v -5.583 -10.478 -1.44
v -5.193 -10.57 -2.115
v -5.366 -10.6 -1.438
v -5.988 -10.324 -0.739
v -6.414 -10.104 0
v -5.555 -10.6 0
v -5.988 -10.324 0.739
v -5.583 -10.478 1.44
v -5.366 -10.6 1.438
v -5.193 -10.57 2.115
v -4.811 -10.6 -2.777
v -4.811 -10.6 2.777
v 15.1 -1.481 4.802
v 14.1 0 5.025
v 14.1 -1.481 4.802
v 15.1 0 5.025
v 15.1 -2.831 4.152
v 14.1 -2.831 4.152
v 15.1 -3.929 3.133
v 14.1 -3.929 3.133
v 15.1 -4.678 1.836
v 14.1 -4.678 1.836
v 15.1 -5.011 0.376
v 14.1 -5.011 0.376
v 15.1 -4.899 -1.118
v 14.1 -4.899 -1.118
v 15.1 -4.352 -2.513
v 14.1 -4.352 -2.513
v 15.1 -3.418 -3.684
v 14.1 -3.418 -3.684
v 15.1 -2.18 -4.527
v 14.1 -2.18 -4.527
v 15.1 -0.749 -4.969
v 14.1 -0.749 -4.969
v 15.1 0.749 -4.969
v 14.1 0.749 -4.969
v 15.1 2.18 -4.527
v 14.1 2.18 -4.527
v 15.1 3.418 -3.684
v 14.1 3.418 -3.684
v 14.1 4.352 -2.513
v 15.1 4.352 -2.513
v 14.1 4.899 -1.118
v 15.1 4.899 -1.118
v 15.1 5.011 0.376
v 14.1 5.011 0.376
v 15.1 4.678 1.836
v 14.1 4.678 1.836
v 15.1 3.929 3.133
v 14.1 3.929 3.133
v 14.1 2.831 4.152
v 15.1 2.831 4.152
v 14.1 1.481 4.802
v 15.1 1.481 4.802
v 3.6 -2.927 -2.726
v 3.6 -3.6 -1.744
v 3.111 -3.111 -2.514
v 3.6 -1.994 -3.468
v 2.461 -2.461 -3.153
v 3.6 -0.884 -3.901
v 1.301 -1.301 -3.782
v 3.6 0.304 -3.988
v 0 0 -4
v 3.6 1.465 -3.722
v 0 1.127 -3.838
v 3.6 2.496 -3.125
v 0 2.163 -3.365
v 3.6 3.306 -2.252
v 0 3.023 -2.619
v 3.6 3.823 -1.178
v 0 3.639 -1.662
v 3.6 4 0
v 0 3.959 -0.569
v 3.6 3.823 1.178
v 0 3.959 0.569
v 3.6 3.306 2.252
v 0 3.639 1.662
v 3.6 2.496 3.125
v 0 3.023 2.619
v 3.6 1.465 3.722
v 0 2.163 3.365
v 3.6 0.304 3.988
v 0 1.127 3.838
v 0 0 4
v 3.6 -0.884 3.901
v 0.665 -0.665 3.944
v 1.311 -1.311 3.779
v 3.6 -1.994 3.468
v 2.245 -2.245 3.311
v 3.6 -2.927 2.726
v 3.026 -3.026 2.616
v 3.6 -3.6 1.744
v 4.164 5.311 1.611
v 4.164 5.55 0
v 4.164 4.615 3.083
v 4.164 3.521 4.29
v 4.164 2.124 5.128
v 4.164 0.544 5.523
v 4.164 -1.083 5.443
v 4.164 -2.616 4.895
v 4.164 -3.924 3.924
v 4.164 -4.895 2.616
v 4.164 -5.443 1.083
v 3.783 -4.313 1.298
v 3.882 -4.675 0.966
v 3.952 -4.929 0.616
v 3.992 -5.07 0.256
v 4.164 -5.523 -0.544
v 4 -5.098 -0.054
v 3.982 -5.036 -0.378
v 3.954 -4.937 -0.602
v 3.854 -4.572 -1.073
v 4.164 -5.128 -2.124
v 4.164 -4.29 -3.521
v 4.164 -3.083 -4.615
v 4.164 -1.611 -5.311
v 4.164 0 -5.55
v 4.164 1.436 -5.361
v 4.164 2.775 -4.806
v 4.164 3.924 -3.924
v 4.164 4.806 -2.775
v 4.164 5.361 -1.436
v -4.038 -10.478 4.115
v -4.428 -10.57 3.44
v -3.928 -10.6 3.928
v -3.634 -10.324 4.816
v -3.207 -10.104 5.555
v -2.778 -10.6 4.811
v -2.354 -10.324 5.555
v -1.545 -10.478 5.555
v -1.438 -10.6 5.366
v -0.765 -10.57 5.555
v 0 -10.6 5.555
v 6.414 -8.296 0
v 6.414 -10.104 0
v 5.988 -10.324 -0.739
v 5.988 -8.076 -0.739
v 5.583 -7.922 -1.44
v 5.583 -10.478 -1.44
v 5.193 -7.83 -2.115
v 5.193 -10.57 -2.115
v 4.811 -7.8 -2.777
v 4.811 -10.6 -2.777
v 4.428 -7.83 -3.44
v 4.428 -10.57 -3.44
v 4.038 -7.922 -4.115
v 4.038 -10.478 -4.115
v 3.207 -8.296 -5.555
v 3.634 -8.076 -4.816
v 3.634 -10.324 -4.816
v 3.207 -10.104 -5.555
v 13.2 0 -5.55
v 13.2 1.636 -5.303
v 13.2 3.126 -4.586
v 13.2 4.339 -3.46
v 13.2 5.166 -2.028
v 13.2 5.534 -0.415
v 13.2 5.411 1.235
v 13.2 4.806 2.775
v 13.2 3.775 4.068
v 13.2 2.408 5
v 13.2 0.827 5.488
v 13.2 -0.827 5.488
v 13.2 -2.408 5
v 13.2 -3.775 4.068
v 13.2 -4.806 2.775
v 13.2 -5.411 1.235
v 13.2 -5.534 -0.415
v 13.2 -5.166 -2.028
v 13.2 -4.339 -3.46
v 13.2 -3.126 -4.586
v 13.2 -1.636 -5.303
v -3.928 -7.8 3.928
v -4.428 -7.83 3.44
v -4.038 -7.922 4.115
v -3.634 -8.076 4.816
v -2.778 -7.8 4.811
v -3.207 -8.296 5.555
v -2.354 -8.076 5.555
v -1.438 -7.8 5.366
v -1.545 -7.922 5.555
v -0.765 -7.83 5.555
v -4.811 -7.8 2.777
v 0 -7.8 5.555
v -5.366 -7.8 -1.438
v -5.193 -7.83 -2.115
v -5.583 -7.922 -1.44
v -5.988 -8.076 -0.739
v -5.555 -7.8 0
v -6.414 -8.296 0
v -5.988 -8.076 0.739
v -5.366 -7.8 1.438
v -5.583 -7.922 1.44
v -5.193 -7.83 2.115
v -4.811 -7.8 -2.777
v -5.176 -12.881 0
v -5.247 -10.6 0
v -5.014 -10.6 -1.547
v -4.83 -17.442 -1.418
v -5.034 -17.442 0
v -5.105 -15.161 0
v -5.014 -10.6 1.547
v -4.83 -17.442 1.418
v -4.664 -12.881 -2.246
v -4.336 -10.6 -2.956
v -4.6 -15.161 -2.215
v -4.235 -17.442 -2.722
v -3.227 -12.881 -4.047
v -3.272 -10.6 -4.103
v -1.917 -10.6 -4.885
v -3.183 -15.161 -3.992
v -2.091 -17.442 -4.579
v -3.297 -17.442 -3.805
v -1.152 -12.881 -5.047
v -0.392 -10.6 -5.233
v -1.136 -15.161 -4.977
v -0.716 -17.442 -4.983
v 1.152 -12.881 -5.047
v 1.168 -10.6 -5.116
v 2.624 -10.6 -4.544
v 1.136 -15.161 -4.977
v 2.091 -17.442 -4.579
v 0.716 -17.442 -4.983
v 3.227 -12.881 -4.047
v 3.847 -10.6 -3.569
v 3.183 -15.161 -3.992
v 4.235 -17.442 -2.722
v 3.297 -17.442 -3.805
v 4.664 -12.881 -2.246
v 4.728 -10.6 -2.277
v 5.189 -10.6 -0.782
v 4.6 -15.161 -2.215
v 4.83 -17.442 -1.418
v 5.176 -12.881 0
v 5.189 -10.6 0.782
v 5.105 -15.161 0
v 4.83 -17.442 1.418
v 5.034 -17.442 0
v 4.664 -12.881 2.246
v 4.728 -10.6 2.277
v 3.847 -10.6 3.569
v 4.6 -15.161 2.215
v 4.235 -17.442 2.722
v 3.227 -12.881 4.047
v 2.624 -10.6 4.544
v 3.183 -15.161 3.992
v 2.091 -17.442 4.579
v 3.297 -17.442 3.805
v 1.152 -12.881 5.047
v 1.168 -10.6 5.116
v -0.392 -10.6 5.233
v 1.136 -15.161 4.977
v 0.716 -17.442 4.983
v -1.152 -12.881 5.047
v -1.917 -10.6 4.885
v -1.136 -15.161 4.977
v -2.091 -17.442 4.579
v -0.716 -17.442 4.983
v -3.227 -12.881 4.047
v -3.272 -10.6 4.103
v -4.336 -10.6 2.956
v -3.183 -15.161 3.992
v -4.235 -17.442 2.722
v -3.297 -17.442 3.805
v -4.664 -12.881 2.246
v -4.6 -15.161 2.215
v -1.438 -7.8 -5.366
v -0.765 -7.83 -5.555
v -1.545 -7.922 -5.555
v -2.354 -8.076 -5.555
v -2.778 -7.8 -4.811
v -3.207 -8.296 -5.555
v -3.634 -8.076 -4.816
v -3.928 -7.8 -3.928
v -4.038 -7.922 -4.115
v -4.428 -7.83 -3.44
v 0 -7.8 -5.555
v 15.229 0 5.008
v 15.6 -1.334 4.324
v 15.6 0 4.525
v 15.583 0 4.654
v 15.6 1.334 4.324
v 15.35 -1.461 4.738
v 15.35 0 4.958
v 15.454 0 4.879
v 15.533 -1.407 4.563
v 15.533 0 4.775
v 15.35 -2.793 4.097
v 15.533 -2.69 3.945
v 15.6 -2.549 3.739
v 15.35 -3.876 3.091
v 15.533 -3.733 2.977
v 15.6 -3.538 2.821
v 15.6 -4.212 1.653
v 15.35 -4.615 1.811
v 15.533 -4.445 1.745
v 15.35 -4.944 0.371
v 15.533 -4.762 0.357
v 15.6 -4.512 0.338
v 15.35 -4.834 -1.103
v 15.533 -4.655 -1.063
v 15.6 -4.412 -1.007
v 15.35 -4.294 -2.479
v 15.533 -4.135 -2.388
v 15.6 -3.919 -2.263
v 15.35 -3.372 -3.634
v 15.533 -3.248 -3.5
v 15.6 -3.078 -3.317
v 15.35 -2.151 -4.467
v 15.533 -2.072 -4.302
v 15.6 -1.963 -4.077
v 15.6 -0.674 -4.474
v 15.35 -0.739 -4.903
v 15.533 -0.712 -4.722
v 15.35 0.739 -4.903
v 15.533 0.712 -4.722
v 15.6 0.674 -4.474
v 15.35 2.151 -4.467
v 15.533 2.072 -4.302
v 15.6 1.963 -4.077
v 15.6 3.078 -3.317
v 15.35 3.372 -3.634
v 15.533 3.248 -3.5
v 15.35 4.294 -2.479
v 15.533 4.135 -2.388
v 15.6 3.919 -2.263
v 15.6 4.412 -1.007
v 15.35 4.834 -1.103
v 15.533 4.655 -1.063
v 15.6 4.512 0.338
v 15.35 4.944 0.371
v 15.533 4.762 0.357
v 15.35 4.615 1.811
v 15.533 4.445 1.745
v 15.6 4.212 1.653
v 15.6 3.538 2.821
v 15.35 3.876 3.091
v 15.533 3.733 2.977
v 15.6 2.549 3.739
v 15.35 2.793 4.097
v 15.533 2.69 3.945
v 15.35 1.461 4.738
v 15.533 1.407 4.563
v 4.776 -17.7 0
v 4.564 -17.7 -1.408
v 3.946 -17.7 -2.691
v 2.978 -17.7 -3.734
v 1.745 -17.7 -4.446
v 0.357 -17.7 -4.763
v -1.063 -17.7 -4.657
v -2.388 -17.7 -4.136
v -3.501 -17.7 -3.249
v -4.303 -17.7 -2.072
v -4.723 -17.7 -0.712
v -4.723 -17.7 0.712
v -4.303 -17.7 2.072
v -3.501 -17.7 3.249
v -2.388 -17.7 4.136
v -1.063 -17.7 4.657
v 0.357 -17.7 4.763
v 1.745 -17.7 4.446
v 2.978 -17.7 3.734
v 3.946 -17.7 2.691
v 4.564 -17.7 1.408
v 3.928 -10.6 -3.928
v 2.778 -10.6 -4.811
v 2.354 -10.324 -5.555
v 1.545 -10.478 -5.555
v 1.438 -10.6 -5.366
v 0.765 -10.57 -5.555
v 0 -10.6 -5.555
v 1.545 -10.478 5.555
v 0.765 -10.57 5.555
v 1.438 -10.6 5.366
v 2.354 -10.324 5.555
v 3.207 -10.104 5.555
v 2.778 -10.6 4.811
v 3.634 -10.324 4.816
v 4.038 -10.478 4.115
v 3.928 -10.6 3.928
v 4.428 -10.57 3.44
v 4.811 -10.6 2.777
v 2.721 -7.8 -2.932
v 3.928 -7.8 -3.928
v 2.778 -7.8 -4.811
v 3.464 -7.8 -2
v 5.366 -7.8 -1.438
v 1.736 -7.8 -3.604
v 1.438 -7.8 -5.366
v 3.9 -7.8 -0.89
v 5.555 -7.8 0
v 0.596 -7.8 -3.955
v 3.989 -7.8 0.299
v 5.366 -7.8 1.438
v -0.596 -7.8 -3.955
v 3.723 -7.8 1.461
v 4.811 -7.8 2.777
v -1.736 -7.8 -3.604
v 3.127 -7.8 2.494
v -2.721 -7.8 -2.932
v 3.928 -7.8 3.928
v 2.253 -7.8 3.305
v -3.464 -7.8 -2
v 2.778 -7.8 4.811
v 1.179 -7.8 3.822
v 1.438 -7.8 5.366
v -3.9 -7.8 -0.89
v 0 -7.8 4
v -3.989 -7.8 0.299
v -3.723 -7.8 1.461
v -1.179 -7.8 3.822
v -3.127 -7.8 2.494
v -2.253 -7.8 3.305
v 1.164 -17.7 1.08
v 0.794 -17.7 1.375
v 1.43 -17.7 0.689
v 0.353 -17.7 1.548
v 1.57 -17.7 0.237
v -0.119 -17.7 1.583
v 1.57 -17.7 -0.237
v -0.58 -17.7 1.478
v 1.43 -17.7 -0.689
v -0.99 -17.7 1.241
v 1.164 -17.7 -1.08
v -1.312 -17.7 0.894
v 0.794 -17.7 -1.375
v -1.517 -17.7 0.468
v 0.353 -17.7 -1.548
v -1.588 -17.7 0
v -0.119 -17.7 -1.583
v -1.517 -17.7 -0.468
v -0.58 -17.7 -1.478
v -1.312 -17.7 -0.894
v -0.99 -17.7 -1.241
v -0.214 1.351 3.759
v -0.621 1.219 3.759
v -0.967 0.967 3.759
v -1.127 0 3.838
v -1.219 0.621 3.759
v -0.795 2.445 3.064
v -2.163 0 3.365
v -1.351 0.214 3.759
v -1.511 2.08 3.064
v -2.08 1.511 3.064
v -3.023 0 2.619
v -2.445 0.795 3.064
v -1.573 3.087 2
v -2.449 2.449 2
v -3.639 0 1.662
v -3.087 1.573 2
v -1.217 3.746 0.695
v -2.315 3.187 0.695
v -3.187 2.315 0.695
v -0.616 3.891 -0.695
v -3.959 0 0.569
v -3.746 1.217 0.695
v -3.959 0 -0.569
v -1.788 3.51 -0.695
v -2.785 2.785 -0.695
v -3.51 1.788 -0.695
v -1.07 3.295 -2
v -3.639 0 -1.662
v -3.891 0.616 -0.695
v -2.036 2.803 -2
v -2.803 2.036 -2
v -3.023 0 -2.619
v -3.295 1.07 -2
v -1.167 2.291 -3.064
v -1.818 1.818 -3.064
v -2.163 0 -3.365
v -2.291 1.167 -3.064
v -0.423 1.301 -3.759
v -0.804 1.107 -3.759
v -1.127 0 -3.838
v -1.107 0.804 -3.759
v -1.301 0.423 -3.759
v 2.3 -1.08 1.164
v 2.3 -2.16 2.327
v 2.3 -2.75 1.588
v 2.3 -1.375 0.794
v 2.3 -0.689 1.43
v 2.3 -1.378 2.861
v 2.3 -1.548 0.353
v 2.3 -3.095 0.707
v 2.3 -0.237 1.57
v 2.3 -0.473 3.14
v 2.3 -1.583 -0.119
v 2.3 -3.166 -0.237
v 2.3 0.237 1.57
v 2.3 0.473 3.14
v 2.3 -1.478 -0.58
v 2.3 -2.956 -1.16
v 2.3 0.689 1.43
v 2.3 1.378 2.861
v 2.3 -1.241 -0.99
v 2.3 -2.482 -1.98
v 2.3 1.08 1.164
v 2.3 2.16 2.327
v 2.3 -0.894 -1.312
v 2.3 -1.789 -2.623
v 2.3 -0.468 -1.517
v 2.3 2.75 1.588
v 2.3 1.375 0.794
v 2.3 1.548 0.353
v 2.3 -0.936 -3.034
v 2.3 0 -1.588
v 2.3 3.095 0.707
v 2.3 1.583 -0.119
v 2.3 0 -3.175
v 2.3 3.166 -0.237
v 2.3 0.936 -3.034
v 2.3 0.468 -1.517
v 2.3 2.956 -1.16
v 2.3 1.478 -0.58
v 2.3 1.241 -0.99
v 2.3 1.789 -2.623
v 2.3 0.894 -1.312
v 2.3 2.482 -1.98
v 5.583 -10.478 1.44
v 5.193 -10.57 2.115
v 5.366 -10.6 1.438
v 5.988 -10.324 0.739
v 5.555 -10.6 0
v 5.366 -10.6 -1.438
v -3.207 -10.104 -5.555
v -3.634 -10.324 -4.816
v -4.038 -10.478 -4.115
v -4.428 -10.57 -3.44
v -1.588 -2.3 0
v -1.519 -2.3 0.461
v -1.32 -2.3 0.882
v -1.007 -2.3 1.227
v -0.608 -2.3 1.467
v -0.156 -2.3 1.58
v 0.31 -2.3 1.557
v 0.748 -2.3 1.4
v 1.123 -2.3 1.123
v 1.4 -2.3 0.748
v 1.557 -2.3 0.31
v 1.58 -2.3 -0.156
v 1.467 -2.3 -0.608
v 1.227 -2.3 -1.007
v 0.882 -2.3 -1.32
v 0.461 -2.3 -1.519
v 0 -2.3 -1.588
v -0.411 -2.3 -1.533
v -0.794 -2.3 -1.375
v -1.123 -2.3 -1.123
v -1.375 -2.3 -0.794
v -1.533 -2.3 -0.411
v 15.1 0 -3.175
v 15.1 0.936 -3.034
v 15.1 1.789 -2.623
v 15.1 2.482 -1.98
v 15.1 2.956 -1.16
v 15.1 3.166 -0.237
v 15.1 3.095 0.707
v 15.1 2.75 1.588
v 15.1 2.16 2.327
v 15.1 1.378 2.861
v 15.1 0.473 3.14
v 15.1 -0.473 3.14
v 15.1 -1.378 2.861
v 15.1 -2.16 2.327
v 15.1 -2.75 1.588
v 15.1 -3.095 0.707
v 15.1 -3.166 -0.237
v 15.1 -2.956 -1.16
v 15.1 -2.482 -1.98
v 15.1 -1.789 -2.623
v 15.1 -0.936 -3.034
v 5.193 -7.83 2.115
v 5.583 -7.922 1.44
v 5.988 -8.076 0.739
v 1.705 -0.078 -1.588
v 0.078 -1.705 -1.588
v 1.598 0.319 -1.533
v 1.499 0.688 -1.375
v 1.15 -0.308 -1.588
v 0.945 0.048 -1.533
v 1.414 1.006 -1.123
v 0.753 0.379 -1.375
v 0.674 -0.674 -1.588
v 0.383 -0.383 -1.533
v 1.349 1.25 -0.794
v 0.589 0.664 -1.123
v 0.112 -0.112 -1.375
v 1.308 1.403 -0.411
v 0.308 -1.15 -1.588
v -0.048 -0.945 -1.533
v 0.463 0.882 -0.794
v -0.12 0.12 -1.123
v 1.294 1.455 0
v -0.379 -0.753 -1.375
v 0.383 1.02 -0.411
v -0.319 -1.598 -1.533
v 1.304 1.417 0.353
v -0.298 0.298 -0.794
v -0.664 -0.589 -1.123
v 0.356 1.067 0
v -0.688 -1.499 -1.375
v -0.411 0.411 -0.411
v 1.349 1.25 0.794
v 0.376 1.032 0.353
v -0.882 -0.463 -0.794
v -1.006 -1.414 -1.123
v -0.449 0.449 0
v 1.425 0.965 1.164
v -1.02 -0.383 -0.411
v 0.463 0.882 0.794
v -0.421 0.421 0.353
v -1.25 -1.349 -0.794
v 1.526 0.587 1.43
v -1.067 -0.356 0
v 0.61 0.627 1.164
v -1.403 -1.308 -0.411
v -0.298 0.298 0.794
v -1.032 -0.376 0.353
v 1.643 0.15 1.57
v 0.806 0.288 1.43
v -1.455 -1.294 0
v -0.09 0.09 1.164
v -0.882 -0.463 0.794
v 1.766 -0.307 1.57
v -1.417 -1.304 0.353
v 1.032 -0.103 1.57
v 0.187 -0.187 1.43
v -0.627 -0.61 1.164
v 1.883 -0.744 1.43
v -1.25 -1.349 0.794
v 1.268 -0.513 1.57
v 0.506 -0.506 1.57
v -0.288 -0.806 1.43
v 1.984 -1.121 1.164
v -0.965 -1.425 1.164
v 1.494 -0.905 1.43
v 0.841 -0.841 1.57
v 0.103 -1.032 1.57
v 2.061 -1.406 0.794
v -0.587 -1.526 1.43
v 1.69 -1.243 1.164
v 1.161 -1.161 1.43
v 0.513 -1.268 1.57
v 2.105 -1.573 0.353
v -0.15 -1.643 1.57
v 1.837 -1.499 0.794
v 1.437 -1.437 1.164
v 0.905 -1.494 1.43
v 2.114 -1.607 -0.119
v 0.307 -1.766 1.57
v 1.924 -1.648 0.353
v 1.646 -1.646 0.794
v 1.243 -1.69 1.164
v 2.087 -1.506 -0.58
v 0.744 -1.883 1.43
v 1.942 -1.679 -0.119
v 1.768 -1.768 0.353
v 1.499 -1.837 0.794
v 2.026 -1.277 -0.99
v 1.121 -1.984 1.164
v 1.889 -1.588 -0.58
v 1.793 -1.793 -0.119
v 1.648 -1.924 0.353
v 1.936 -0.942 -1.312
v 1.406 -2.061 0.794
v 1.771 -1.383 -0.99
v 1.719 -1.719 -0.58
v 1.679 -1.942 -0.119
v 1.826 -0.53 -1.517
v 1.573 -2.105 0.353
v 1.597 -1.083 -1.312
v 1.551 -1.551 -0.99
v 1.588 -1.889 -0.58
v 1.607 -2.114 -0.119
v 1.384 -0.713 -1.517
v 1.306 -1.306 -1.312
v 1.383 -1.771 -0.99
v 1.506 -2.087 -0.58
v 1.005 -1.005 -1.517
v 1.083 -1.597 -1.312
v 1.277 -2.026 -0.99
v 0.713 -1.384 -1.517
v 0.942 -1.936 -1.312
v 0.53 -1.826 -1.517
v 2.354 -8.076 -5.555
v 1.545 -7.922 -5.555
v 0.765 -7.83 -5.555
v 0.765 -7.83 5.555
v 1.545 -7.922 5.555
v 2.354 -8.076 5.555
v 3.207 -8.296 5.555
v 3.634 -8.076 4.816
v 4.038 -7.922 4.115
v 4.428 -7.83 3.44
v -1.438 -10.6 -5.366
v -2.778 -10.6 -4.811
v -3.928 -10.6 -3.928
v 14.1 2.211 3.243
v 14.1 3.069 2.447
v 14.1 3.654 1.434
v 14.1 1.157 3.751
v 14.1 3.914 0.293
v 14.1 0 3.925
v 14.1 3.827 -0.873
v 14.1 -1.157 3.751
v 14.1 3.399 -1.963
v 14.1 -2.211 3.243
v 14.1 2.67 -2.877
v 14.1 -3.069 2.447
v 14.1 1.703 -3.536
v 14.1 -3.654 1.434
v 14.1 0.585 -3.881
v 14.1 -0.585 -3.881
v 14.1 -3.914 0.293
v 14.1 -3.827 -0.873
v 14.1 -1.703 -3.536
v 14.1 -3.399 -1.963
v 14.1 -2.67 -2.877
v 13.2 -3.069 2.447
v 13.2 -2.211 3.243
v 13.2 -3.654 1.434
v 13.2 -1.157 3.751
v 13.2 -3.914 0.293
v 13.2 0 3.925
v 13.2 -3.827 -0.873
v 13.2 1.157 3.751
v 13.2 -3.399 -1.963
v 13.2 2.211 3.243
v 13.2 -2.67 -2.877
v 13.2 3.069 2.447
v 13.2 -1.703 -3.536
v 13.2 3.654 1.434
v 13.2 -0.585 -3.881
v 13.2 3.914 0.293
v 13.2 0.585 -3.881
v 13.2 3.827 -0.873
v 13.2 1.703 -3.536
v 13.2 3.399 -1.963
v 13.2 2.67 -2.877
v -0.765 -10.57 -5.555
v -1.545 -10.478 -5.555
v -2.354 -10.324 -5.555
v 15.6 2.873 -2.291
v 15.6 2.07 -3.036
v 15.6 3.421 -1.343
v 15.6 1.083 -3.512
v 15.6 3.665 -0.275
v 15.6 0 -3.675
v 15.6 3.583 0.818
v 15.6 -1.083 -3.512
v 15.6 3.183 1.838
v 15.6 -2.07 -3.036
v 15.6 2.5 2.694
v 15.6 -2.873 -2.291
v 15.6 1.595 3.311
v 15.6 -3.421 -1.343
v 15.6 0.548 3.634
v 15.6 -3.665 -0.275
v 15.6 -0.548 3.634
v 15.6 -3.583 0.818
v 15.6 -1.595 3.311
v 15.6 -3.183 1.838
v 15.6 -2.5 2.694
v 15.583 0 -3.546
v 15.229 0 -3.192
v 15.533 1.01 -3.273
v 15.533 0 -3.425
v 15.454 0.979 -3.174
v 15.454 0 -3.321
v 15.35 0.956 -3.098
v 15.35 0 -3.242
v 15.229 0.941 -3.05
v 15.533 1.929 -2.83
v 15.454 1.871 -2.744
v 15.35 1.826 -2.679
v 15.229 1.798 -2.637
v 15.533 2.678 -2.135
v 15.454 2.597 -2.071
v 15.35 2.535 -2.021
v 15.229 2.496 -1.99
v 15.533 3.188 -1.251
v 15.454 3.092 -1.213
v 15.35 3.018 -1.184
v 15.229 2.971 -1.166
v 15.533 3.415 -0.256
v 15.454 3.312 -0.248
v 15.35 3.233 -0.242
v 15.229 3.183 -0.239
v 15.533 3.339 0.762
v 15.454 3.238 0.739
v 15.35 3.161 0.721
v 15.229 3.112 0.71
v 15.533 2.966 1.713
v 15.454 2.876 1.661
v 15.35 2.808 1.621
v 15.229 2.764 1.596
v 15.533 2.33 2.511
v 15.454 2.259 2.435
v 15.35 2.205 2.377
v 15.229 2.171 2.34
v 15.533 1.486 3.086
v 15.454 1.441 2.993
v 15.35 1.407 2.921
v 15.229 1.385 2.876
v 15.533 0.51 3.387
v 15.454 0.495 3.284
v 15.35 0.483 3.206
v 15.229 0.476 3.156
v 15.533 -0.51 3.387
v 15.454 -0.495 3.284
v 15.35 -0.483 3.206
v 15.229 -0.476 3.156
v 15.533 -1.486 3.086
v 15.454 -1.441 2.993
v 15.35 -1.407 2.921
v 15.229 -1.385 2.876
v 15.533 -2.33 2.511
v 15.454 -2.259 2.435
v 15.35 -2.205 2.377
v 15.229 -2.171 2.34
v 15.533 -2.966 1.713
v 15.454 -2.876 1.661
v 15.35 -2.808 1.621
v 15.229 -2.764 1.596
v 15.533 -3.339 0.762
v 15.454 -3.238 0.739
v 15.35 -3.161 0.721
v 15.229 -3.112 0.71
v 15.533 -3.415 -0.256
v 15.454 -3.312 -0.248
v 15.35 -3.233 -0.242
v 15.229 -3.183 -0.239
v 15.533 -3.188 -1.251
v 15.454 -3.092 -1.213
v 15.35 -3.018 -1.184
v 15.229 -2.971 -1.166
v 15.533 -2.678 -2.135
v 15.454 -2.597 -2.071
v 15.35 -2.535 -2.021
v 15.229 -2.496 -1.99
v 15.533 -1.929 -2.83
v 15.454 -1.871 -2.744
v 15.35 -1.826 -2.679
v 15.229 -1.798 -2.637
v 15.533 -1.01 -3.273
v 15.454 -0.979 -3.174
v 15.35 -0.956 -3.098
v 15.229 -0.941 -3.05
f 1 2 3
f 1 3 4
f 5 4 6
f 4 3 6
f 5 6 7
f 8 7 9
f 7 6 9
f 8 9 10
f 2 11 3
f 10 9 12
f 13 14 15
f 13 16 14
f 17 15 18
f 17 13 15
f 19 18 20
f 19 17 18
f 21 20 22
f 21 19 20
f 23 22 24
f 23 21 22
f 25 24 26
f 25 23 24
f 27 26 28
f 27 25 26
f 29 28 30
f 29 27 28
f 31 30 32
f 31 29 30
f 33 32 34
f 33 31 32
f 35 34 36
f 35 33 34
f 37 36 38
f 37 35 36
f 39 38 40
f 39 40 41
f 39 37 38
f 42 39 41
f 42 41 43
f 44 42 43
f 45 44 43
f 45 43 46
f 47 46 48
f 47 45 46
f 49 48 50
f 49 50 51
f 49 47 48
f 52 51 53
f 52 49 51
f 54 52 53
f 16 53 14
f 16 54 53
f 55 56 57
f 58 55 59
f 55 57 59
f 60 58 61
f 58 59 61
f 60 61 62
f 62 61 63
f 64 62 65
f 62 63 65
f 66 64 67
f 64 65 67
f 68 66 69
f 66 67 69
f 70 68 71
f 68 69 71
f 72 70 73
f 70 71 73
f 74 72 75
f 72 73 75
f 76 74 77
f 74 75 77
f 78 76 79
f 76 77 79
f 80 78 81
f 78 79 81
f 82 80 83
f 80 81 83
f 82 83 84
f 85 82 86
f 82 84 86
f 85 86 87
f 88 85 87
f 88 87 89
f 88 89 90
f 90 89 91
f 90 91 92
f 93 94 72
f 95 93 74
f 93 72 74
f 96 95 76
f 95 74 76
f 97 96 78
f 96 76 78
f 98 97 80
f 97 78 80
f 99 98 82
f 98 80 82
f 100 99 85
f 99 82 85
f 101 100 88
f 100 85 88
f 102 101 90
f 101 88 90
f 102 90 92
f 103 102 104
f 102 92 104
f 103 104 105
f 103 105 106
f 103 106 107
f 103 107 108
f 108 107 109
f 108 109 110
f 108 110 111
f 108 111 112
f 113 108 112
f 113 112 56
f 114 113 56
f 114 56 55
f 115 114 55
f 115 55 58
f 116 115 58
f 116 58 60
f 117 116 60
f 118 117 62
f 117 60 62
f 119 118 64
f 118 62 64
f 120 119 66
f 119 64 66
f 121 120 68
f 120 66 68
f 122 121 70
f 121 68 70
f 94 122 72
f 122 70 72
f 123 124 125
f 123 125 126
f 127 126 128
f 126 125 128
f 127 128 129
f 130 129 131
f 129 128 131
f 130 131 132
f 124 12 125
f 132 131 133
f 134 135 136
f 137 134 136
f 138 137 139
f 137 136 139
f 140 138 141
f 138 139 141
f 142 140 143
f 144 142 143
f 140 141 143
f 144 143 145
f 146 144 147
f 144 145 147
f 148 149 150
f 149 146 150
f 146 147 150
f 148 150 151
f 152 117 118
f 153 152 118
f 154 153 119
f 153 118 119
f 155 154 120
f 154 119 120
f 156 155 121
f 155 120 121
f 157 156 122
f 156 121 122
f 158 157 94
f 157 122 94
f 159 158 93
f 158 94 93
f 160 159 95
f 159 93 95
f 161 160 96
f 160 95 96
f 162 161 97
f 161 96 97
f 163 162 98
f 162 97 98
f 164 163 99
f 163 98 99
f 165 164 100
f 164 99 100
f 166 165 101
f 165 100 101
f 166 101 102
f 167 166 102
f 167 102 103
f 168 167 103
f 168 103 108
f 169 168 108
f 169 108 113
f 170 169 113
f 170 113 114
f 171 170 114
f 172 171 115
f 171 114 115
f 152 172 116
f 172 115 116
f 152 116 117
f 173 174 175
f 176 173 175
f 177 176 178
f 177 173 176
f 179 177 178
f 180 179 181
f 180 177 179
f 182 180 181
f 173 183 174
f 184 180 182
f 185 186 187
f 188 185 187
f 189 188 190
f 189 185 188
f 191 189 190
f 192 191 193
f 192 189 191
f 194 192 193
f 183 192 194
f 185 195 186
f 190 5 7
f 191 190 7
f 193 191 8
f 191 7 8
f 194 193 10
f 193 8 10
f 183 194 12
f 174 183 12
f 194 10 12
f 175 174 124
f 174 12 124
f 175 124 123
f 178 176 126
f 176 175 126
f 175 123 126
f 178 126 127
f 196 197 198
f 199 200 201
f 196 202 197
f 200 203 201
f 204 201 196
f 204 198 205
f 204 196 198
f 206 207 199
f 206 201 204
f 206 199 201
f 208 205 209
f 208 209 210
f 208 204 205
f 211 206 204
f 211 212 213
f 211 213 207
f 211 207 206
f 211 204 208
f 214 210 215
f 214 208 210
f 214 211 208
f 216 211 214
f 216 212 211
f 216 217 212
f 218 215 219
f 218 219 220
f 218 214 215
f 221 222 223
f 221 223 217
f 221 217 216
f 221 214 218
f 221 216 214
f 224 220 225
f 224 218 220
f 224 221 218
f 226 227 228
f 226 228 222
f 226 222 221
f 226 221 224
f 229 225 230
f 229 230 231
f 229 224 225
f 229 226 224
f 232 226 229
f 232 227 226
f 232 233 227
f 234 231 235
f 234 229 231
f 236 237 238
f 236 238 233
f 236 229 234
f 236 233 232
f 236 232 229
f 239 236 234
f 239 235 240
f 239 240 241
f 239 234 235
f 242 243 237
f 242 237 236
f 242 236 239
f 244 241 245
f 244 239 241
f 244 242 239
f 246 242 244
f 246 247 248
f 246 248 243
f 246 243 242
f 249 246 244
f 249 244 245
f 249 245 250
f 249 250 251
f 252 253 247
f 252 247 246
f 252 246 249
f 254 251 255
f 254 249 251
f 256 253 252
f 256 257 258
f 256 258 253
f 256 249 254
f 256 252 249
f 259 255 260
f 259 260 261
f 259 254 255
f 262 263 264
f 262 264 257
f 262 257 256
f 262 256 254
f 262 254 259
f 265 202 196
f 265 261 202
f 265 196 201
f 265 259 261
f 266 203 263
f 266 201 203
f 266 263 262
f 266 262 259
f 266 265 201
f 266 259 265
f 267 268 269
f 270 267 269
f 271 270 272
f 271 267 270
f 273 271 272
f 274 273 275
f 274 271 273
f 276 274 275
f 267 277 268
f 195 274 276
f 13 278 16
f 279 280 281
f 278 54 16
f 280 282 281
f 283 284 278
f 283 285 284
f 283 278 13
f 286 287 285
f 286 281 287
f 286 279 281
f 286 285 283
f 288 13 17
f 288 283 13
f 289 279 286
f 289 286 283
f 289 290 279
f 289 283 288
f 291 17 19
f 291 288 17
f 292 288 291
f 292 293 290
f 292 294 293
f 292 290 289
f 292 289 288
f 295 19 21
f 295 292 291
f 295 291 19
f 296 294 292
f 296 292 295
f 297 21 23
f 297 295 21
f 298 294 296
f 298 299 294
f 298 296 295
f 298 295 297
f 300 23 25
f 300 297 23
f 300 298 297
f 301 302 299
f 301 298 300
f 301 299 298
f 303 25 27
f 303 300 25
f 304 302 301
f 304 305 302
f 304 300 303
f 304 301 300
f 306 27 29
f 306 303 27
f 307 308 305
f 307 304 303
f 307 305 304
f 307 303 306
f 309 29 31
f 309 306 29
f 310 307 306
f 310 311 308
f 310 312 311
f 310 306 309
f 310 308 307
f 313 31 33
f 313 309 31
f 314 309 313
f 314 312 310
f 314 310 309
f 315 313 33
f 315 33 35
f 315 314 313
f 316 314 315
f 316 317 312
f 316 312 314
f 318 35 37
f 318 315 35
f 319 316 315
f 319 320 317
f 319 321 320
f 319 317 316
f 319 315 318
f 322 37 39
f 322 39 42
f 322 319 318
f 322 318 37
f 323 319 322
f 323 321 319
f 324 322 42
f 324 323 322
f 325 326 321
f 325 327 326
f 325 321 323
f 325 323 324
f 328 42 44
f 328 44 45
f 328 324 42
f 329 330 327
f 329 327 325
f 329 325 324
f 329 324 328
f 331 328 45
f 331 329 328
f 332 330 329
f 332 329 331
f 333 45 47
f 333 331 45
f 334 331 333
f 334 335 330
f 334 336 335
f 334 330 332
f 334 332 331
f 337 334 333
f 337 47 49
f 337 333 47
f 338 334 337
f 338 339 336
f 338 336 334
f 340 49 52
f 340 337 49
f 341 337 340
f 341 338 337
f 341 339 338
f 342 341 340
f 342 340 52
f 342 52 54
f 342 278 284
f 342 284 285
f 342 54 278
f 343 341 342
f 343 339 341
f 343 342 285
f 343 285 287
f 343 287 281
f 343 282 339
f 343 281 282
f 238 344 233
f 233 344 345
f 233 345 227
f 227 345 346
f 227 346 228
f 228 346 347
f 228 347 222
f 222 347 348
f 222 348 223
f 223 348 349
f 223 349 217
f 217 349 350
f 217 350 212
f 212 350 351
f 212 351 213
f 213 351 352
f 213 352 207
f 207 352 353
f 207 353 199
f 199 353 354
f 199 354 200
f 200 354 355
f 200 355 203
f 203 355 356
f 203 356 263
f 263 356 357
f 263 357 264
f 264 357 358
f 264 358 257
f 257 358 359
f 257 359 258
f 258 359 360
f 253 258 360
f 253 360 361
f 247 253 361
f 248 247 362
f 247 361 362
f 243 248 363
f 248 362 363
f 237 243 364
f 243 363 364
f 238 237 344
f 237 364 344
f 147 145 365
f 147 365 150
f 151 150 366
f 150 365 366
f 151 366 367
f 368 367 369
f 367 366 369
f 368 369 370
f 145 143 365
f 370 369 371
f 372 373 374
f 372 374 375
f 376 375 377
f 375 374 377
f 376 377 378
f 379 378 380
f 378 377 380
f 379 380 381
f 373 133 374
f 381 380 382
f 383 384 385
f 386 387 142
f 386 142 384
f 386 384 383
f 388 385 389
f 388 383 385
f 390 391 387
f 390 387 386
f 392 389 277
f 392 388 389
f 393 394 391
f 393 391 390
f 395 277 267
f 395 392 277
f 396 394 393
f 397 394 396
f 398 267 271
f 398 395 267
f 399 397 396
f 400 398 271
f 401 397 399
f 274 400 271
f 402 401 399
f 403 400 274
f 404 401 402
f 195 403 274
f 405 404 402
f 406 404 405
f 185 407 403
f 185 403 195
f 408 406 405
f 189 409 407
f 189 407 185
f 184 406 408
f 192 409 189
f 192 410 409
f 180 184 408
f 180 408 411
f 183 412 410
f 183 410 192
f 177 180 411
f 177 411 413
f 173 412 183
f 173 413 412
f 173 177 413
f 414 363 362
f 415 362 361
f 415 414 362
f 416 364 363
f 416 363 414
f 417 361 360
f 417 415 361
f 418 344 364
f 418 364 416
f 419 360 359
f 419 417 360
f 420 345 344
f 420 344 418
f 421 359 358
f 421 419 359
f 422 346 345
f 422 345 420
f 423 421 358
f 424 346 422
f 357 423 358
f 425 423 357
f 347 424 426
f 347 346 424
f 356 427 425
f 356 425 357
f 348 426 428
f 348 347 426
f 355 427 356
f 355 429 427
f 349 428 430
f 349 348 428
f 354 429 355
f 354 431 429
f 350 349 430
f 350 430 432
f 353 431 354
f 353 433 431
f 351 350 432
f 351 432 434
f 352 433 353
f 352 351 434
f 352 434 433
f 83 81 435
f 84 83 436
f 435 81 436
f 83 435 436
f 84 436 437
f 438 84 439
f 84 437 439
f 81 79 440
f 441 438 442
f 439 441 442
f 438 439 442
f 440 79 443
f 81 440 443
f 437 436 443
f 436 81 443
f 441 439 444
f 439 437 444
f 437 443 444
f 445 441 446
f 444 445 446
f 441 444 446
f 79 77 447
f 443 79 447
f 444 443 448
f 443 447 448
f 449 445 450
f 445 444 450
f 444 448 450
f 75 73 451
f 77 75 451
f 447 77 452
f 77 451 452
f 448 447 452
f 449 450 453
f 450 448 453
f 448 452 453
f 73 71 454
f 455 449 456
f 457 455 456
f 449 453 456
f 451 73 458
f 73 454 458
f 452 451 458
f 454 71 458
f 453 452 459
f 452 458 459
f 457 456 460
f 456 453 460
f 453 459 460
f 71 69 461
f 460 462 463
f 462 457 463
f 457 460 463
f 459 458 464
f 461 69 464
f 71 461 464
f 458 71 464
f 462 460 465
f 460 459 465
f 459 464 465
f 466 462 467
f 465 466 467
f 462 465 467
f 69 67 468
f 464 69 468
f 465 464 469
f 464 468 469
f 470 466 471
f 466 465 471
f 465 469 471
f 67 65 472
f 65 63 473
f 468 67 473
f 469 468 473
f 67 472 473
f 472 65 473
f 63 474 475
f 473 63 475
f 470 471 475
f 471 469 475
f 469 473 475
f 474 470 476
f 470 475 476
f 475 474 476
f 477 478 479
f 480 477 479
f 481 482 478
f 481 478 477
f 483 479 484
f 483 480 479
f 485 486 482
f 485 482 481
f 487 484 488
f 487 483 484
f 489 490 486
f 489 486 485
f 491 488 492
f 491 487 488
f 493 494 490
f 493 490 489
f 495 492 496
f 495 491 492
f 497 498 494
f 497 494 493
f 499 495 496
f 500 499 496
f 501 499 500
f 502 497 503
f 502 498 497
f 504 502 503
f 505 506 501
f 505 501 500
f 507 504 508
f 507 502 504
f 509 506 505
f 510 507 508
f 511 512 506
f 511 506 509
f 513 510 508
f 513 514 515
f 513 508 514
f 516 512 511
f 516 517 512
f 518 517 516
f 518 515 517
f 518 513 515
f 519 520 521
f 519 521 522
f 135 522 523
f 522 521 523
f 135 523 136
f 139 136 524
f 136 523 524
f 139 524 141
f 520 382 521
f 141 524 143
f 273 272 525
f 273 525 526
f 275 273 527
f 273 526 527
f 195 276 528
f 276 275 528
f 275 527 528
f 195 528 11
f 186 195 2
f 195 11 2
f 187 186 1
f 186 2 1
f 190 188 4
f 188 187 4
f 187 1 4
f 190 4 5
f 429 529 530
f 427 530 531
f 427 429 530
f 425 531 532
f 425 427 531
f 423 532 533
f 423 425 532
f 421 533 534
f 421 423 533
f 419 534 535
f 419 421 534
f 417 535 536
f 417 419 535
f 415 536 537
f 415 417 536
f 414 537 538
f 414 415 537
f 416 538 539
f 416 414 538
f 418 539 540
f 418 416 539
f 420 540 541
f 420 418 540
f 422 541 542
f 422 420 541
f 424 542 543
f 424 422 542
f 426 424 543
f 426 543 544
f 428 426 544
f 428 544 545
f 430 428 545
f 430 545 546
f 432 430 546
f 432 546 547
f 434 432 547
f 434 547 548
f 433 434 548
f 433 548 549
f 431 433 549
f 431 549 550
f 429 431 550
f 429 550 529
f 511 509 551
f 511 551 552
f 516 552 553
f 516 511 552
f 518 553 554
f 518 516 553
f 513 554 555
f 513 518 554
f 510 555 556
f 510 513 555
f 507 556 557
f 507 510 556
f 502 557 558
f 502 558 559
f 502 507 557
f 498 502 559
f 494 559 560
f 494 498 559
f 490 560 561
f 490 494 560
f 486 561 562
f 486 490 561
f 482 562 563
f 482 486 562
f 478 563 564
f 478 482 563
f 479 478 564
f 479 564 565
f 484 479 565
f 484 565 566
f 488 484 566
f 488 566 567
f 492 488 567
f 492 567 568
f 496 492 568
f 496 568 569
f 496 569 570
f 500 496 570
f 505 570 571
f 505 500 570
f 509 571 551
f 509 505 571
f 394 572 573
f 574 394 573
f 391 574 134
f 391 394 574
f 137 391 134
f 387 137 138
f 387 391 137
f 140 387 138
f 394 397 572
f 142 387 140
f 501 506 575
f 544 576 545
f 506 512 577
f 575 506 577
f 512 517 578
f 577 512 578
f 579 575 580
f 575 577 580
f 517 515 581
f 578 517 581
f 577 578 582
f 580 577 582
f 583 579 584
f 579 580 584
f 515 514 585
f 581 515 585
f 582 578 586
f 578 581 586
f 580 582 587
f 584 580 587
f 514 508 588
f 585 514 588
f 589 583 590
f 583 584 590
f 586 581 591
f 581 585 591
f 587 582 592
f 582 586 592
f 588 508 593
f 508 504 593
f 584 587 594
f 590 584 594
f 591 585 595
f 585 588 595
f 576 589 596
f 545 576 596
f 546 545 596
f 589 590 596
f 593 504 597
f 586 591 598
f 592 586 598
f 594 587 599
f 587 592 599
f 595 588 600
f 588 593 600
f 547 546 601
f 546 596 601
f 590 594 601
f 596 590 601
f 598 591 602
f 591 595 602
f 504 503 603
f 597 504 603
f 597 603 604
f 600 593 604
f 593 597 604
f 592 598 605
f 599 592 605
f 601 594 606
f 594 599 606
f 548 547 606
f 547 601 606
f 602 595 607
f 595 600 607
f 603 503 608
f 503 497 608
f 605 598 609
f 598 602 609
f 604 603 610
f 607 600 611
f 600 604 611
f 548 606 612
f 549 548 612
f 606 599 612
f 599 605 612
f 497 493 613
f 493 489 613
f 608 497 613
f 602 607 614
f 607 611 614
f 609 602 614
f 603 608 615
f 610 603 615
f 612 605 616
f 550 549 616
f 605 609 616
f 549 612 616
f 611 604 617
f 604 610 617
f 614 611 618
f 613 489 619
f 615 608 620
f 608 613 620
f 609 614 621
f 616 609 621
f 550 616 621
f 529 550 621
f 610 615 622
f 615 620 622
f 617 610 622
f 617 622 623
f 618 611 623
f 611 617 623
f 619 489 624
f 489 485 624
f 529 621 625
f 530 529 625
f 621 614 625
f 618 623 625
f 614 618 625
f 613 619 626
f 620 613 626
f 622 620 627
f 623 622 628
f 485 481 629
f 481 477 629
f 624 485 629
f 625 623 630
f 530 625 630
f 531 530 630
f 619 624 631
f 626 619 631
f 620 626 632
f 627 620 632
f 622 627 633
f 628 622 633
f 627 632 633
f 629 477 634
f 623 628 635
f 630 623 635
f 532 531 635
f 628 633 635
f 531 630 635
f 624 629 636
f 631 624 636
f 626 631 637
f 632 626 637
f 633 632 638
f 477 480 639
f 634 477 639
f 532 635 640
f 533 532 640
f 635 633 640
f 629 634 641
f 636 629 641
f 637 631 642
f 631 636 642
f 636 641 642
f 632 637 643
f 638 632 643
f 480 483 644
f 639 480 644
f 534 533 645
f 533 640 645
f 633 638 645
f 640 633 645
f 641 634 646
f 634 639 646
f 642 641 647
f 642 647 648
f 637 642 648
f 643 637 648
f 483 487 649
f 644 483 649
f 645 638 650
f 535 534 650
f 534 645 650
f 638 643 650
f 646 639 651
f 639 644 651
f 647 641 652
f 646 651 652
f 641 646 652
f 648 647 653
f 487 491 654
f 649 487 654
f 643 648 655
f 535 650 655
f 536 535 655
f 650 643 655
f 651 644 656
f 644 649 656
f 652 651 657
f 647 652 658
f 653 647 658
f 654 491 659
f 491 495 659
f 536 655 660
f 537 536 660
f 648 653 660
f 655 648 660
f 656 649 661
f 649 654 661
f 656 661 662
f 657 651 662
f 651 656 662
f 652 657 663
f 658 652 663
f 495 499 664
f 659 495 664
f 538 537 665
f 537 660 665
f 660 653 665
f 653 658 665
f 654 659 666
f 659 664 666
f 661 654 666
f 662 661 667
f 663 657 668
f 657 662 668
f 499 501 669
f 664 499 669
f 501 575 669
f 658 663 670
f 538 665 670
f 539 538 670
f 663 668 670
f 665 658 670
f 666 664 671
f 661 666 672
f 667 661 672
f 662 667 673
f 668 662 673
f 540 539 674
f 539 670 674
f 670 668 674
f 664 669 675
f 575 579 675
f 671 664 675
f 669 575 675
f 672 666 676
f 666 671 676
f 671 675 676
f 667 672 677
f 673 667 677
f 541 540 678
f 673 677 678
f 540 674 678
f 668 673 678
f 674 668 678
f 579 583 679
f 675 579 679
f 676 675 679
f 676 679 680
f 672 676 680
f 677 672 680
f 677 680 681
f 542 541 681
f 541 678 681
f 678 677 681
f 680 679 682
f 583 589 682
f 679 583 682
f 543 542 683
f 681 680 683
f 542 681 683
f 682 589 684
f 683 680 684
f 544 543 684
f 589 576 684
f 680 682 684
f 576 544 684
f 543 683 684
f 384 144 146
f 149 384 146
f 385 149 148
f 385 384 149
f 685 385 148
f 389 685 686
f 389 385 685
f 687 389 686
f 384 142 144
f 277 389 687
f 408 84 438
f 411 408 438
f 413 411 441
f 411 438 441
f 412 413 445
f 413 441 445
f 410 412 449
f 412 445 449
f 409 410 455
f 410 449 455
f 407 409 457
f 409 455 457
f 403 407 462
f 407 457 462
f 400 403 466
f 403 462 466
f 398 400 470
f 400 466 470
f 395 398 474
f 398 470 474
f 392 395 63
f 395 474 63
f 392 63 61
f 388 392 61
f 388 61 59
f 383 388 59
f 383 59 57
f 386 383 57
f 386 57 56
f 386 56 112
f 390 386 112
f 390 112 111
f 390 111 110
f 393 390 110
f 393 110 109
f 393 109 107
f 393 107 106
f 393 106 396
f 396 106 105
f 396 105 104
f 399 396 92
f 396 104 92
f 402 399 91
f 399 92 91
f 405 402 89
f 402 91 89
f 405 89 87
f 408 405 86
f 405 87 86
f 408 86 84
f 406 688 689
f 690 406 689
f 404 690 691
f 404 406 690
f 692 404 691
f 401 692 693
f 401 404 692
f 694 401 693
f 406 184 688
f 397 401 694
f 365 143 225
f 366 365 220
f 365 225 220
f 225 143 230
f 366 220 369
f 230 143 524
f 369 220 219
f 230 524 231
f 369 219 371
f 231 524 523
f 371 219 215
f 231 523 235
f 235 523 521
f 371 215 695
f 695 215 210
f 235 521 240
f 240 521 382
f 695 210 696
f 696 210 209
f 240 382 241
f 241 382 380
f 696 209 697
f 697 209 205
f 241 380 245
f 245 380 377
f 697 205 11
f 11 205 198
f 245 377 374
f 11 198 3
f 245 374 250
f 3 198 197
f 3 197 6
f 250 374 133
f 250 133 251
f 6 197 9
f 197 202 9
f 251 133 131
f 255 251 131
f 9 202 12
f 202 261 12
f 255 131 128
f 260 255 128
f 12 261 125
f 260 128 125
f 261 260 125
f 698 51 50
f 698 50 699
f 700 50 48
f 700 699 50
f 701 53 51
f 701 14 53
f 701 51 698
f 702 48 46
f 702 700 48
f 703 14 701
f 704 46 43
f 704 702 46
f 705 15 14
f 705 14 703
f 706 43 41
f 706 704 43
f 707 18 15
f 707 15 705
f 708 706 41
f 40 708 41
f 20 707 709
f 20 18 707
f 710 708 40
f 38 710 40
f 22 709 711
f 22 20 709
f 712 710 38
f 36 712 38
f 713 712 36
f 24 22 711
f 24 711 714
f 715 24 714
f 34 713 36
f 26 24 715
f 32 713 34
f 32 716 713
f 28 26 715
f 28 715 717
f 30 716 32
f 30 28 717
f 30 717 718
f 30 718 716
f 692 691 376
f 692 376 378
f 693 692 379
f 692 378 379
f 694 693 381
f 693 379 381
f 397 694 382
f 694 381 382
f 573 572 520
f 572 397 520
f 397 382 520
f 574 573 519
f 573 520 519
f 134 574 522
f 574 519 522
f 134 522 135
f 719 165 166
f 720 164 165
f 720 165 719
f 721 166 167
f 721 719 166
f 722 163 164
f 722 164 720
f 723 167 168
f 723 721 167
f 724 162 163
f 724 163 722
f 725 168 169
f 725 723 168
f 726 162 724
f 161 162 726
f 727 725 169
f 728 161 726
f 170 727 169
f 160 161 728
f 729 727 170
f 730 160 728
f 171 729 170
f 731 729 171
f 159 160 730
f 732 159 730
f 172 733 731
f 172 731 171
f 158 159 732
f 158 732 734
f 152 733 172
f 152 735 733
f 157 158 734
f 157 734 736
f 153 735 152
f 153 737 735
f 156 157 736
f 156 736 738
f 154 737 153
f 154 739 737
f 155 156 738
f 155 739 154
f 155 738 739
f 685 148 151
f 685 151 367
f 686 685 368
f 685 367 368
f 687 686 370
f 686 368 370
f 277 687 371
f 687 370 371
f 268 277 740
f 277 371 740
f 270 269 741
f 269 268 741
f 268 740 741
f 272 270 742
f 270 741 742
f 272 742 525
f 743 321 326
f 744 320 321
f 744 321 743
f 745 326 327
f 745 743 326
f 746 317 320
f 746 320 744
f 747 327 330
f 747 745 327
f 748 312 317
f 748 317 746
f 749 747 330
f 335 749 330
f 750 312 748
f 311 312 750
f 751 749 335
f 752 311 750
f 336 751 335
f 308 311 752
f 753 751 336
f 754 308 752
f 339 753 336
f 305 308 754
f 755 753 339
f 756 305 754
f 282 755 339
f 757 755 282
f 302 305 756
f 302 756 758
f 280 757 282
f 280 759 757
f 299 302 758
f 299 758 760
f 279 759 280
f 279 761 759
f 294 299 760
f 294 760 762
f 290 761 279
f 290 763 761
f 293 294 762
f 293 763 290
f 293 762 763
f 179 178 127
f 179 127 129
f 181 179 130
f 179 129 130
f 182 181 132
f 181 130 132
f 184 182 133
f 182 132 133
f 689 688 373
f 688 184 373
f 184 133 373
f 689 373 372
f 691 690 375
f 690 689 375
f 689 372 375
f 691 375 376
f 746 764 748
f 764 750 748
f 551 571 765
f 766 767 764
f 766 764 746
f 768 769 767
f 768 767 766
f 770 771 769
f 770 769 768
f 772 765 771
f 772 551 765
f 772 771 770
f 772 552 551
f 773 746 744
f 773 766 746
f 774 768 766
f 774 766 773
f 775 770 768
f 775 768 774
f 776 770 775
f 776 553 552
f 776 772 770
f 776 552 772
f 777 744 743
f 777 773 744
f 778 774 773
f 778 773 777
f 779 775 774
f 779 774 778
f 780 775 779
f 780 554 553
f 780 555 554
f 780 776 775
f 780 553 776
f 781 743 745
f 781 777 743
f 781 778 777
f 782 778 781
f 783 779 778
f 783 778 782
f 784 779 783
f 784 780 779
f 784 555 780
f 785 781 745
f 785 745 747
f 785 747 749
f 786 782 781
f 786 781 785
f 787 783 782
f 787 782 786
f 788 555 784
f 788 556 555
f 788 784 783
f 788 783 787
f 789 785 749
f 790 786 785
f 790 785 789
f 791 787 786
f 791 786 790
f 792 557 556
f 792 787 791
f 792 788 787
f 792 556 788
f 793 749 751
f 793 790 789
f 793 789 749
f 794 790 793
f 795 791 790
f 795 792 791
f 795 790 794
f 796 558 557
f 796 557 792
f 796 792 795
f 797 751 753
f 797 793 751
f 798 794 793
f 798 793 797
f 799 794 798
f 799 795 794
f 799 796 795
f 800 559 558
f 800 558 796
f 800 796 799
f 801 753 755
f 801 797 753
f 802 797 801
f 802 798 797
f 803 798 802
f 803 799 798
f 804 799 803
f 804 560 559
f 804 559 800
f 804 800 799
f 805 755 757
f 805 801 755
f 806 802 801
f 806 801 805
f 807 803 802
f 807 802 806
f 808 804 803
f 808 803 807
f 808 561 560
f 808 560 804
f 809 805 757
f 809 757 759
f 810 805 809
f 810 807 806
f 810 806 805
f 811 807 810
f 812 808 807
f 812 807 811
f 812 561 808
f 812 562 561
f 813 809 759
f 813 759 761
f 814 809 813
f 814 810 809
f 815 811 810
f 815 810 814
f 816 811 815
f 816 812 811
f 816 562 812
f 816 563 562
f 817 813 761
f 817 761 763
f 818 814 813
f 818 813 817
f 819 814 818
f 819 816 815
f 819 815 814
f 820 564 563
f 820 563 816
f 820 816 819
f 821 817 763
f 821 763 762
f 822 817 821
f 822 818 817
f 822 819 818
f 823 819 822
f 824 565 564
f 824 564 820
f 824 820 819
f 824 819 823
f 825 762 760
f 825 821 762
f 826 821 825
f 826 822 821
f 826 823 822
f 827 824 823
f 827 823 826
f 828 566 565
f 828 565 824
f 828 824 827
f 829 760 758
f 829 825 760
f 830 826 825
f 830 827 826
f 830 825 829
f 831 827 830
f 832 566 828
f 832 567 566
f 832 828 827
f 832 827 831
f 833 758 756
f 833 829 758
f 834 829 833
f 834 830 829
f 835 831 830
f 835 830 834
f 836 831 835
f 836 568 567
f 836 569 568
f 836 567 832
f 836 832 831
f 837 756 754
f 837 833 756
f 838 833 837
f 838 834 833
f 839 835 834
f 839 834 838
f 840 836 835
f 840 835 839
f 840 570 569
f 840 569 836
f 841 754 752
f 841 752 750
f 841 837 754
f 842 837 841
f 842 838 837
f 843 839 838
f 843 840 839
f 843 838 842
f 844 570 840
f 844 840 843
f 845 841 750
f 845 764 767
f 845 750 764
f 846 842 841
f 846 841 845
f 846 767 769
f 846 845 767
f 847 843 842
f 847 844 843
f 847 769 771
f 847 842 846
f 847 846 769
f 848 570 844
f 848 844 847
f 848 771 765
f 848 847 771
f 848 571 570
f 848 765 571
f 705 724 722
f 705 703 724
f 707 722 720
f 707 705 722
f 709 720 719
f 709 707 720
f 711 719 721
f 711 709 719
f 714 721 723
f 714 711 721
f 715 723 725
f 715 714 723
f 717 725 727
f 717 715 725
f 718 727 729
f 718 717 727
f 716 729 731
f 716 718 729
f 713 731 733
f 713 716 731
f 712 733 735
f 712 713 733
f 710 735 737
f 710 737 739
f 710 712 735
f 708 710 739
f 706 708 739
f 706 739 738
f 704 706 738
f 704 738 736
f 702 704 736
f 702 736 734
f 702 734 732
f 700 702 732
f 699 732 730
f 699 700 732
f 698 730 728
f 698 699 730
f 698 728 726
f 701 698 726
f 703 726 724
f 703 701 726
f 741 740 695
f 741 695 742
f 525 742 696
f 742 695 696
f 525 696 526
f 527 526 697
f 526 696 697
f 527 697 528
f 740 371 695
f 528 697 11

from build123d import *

# Parameters (mm, degrees)
SKETCH1_R             = 4
BASE_EXTRUDE_DEPTH    = 3.6
RBODY_SKETCH_R        = 5.55
RBODY_DEPTH           = 9.6
ELBOW_ANGLE           = 90
SKETCH3_R             = 4
BOSS_EXTRUDE1_DEPTH   = 7.8
NUT_DEPTH             = 2.8
RTUBE_START           = -13.3
RTUBE_SKETCH_R        = 3.175
RTUBE_DEPTH           = 13.3
RTUBE_RADIUS_R        = 0.5
DIAMETER_R            = 1.5875
SKETCH4_W             = 3.5
SKETCH4_H             = 3.95
PORT_THREADS_REACH    = 30.544
PORT_THREADS_SKETCH_R = 1.5875


with BuildPart() as part:
    # Sketch1 → Base-Extrude (new body)
    with BuildSketch(Plane(origin=(0, 0, 0), x_dir=(0, 0, -1), z_dir=(1, 0, 0))):
        with Locations(Location((0, 0, 0), (0, 0, 180))):
            Circle(SKETCH1_R)
    extrude(amount=BASE_EXTRUDE_DEPTH)

    # RBody_Sketch → RBody (add)
    with BuildSketch(Plane(origin=(3.6, 0, 0), x_dir=(0, 0, -1), z_dir=(1, 0, 0))):
        Circle(RBODY_SKETCH_R)
    extrude(amount=RBODY_DEPTH)

    # RBody_Chamfer: read off the stored shape, not the designer's step
    # RBody_Chamfer outline → RBody_Chamfer (revolve, cut)
    with BuildSketch(Plane.YX):
        Polygon((5.55, 4.164153863), (4, 3.6), (5.55, 3.6), align=None)
    revolve(axis=Axis((0, 0, 0), (1, 0, 0)), mode=Mode.SUBTRACT)

    # RRelease_Sketch → RRelease (revolve)
    with BuildSketch(Plane.XY, mode=Mode.PRIVATE) as rrelease_sk:
        with BuildLine():
            Line((13.2, 3.925), (14.1, 3.925))
            Line((14.1, 3.925), (14.1, 5.025))
            Line((14.1, 5.025), (15.1, 5.025))
            ThreePointArc((15.1, 5.025), (15.453553391, 4.878553391), (15.6, 4.525))
            Line((15.6, 4.525), (15.6, 0))
            Line((15.6, 0), (13.2, 0))
            Line((13.2, 0), (13.2, 3.925))
        make_face()
    revolve(rrelease_sk.sketch.rotate(Axis((12.597722381, 0, 0), (1, 0, 0)), 90), axis=Axis((12.597722381, 0, 0), (1, 0, 0)))

    # Elbow_Sketch → Elbow (revolve)
    with BuildSketch(Plane.ZY):
        with BuildLine():
            Line((-4, 0), (4, 0))
            ThreePointArc((4, 0), (0, 4), (-4, 0))
        make_face()
    revolve(axis=Axis((0, 0, -6.487672297), (0, 0, 1)), revolution_arc=ELBOW_ANGLE)

    # Sketch3 → Boss-Extrude1 (add)
    with BuildSketch(Plane.XZ):
        with Locations(Location((0, 0, 0), (0, 0, 90))):
            Circle(SKETCH3_R)
    extrude(amount=BOSS_EXTRUDE1_DEPTH)

    # Nut_Sketch → Nut (add)
    with BuildSketch(Plane(origin=(0, -10.6, 0), x_dir=(-1, 0, 0), z_dir=(0, 1, 0))):
        Polygon((6.414361491, 0), (3.207180745, 5.555), (-3.207180745, 5.555), (-6.414361491, 0), (-3.207180745, -5.555), (3.207180745, -5.555), align=None)
    extrude(amount=NUT_DEPTH)

    # Nut_Chamfer_Sketch → Nut_Chamfer (revolve, cut)
    with BuildSketch(Plane.XY):
        Polygon((-5.555, -7.8), (-6.414361491, -7.8), (-6.414361491, -8.296152588), align=None)
        Polygon((-6.414361491, -10.103847412), (-5.555, -10.6), (-6.414361491, -10.6), align=None)
    revolve(axis=Axis((0, -1.551633987, 0), (0, 1, 0)), mode=Mode.SUBTRACT)

    # Threads_Sketch → Threads (revolve)
    with BuildSketch(Plane.XY):
        Polygon((-5.247489296, -10.6), (-5.026347442, -17.7), (0, -17.7), (0, -10.6), align=None)
    revolve(axis=Axis((0, 0, 0), (0, -1, 0)))

    # Thread_Chamfer: read off the stored shape, not the designer's step
    # Thread_Chamfer outline → Thread_Chamfer (revolve, cut)
    with BuildSketch(Plane.XY):
        Polygon((5.034384454, -17.441962988), (4.776347442, -17.7), (5.034384454, -17.7), align=None)
    revolve(axis=Axis((0, 0, 0), (0, 1, 0)), mode=Mode.SUBTRACT)

    # RTube_Sketch → RTube (cut)
    with BuildSketch(Plane(origin=(15.6, 0, 0), x_dir=(0, 0, -1), z_dir=(1, 0, 0)).offset(RTUBE_START)):
        Circle(RTUBE_SKETCH_R)
    extrude(amount=RTUBE_DEPTH, mode=Mode.SUBTRACT)

    # RTube_Radius
    rtube_radius_edges = [part.edges().sort_by_distance(p)[0] for p in [
        (15.6, 0, 3.175),
    ]]
    fillet(rtube_radius_edges, radius=RTUBE_RADIUS_R)

    # Port_Curve: sweep along a path in Profile
    with BuildLine(Plane.XY) as port_curve_path:
        ThreePointArc((2.3, 0), (0.673654403, -0.673654403), (0, -2.3))
    # Diameter → Port_Curve (sweep, cut)
    with BuildSketch(Plane(origin=(2.3, 0, 0), x_dir=(0, 0, -1), z_dir=(1, 0, 0))):
        Circle(DIAMETER_R)
    sweep(path=port_curve_path.line, mode=Mode.SUBTRACT)

    # Sketch4 → Revolve1 (revolve)
    with BuildSketch(Plane.XY):
        with Locations((-1.75, -12.575)):
            Rectangle(SKETCH4_W, SKETCH4_H)
    revolve(axis=Axis((0, 0, 0), (0, -1, 0)))

    # Port_Threads_Sketch → Port_Threads (cut, up to next)
    with BuildSketch(Plane(origin=(0, -17.7, 0), x_dir=(-1, 0, 0), z_dir=(0, 1, 0)), mode=Mode.PRIVATE) as port_threads_sk1:
        Circle(PORT_THREADS_SKETCH_R)
    port_threads_tool1 = extrude(port_threads_sk1.sketch, amount=PORT_THREADS_REACH, mode=Mode.PRIVATE) & part.part
    add(port_threads_tool1.solids().sort_by_distance((0, -17.7, 0))[0], mode=Mode.SUBTRACT)


solid = part.part
